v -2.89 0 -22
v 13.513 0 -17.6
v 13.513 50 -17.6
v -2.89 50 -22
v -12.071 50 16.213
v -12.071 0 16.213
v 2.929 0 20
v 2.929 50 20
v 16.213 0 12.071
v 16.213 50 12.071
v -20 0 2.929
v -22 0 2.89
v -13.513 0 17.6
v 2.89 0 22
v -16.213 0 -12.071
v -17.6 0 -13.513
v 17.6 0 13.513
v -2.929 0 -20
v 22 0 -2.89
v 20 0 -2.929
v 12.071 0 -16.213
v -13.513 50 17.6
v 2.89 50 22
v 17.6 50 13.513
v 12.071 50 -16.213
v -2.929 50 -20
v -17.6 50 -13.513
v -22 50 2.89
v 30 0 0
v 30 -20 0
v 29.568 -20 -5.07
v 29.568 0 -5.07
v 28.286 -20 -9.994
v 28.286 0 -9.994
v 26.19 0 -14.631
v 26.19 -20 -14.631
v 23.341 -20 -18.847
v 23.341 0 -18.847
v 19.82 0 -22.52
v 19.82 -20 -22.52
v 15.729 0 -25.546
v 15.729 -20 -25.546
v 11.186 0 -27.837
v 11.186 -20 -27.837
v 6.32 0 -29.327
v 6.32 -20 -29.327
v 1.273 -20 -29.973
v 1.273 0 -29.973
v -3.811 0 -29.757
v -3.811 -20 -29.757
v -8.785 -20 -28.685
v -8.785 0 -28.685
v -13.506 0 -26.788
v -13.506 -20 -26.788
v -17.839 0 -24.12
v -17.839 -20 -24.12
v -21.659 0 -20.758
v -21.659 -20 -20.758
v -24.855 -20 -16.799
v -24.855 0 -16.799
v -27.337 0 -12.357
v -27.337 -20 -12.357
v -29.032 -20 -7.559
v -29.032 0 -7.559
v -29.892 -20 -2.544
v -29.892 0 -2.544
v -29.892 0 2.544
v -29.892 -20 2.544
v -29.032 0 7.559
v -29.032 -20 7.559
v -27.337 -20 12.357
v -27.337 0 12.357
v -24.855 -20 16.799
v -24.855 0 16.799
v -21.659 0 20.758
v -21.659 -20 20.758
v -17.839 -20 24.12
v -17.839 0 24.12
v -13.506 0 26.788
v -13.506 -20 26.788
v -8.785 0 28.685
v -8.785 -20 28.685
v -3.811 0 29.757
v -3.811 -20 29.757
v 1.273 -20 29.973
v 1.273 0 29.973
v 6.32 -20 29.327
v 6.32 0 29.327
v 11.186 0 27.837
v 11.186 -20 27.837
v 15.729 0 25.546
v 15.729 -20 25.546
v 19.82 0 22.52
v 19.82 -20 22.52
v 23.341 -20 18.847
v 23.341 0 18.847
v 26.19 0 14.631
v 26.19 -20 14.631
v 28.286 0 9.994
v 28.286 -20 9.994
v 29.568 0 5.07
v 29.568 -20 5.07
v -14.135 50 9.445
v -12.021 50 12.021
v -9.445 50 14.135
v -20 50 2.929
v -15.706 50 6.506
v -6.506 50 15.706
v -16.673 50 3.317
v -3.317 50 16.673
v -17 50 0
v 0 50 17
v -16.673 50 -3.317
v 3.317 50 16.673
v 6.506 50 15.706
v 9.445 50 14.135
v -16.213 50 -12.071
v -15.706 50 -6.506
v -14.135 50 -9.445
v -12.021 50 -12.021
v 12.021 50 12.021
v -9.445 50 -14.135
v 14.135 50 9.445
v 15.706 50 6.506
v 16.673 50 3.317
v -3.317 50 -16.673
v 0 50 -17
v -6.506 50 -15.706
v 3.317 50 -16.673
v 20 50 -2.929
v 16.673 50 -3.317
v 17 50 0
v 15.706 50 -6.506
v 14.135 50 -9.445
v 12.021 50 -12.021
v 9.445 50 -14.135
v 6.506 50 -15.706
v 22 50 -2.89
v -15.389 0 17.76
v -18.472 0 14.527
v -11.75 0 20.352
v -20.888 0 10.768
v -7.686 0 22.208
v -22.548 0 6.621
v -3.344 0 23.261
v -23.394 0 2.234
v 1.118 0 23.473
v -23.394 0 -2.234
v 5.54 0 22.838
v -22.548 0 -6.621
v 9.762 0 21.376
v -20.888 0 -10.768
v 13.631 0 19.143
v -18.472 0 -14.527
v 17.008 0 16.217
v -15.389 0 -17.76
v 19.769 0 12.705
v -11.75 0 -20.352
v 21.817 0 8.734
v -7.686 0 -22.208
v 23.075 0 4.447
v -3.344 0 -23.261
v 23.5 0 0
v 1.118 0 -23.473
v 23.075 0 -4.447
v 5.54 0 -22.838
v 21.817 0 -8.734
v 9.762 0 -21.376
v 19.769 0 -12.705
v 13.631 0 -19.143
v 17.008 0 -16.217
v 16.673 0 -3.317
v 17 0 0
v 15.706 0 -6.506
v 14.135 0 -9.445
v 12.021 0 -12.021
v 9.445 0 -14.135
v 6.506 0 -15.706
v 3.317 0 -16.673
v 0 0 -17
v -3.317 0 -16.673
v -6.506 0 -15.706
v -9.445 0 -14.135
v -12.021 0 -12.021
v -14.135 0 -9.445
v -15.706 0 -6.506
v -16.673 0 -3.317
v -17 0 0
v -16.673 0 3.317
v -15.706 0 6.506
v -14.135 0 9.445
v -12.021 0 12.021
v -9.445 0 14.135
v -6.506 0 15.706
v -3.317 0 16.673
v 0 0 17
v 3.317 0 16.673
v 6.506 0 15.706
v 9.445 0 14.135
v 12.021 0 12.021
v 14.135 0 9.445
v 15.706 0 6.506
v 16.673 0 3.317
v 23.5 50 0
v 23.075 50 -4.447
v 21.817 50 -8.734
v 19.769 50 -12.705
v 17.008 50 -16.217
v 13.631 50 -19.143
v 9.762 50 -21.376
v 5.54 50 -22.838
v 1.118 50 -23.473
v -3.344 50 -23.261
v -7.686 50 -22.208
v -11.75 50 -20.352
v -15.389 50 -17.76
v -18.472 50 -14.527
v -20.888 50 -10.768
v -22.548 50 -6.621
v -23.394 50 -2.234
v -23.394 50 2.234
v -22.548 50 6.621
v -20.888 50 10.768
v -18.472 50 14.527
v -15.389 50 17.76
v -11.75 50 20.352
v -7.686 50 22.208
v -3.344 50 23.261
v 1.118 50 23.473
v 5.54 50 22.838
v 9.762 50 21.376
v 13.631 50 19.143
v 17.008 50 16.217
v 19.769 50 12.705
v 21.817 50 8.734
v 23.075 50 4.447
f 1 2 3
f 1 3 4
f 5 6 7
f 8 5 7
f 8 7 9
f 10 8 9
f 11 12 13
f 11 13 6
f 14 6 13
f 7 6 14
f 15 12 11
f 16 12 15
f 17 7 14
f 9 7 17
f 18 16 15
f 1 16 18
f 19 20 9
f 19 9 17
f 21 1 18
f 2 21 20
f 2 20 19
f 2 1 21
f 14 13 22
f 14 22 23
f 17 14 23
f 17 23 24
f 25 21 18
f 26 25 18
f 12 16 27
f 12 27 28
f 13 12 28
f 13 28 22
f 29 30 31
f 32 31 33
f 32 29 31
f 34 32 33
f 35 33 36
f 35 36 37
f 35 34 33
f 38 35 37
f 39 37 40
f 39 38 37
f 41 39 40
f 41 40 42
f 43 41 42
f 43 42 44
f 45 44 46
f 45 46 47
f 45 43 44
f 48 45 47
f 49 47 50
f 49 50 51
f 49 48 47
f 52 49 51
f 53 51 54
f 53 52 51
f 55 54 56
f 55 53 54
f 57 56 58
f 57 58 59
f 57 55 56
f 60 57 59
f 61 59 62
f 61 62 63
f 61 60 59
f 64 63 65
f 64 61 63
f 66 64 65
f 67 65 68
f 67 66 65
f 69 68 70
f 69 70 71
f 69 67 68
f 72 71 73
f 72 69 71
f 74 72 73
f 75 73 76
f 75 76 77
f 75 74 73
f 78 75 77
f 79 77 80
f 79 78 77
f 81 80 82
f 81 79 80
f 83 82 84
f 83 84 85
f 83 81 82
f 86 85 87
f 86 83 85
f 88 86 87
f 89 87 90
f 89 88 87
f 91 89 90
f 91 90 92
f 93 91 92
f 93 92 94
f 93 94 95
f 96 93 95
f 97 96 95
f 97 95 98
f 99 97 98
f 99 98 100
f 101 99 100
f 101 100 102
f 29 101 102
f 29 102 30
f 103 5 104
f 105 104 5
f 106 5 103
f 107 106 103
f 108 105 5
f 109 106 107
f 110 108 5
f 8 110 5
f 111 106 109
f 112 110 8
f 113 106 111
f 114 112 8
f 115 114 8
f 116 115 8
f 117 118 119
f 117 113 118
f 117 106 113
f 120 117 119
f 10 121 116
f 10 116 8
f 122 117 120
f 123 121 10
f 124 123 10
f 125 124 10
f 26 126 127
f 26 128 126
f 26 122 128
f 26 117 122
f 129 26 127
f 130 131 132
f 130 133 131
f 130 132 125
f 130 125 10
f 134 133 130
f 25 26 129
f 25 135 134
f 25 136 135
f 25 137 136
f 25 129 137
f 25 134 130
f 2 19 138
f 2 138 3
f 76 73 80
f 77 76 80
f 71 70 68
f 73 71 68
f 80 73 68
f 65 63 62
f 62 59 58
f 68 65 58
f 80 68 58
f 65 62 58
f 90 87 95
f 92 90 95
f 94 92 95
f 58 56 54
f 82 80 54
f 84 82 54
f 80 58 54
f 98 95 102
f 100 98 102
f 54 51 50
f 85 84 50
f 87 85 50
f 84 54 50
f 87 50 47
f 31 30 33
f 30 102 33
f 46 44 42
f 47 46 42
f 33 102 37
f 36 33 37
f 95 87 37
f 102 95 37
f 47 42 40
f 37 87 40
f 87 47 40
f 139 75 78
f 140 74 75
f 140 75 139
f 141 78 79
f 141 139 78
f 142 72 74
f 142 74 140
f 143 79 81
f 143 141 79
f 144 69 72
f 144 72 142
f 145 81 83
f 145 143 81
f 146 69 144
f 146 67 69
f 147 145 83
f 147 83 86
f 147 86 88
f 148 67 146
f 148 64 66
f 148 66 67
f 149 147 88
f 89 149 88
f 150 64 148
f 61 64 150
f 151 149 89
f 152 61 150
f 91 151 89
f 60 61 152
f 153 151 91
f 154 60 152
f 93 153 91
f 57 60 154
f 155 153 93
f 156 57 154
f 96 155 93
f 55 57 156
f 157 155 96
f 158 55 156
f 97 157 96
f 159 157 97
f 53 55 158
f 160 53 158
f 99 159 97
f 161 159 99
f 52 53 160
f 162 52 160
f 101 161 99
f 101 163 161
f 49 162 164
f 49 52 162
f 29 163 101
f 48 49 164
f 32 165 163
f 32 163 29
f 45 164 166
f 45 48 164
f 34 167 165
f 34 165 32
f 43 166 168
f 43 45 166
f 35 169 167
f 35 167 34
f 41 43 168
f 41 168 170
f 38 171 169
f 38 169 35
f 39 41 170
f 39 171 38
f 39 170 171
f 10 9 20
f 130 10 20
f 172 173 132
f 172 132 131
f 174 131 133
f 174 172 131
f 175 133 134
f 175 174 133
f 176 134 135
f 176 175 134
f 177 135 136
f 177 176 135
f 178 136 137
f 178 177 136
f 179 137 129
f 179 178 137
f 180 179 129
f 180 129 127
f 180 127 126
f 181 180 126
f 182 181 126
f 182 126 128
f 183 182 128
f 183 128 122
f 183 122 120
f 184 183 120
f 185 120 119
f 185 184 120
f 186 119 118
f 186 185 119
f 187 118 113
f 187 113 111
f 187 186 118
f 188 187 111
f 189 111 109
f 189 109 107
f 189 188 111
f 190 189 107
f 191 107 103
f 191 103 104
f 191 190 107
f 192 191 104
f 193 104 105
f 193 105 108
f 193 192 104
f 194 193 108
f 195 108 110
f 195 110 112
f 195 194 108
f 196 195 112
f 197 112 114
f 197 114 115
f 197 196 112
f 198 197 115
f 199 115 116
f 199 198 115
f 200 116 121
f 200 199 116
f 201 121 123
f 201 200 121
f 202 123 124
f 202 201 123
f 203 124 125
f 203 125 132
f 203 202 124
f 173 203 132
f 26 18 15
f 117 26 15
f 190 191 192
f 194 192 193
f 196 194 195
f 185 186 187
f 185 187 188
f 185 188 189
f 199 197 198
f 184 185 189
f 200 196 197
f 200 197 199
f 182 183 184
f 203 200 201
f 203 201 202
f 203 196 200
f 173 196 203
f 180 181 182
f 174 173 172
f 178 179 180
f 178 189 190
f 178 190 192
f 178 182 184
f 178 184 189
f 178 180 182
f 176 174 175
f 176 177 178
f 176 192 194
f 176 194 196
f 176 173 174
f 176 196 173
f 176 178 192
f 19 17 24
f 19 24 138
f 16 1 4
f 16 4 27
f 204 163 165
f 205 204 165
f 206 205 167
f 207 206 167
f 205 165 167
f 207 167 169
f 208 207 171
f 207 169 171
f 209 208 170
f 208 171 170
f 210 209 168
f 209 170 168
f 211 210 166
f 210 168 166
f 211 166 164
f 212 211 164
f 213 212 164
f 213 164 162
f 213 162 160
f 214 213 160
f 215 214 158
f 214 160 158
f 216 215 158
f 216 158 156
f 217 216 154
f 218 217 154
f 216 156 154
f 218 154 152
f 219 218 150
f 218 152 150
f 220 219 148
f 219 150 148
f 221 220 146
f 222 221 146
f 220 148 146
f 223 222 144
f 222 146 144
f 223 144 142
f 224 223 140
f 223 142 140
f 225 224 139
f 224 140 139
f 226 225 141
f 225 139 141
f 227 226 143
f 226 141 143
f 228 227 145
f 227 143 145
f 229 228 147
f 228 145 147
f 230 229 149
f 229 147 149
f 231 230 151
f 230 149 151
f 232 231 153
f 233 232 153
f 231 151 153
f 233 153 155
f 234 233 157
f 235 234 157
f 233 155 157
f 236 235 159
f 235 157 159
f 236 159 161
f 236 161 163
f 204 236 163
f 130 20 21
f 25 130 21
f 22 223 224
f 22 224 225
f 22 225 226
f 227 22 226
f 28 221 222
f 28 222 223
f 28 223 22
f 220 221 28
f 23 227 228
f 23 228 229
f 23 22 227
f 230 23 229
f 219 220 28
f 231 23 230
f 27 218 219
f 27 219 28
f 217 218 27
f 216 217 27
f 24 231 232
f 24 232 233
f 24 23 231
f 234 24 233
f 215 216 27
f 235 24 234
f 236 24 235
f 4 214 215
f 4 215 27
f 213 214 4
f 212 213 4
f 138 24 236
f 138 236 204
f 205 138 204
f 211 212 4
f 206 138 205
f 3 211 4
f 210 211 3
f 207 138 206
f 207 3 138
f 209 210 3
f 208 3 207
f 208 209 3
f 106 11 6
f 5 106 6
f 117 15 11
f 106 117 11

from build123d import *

# Parameters (mm, degrees)
SKETCH1_R           = 17
BOSS_EXTRUDE2_DEPTH = 50
SKETCH3_R           = 23.5
BOSS_EXTRUDE4_DEPTH = 50
SKETCH8_R           = 30
BOSS_EXTRUDE5_DEPTH = 20


with BuildPart() as part:
    # Sketch1 → Boss-Extrude2 (new body)
    with BuildSketch(Plane(origin=(0, 0, 0), x_dir=(1, 0, 0), z_dir=(0, 1, 0))):
        Polygon((16.213203436, -12.071067812), (20, 2.928932188), (12.071067812, 16.213203436), (-2.928932188, 20), (-16.213203436, 12.071067812), (-20, -2.928932188), (-12.071067812, -16.213203436), (2.928932188, -20), align=None)
        Circle(SKETCH1_R, mode=Mode.SUBTRACT)
    extrude(amount=BOSS_EXTRUDE2_DEPTH)



with BuildPart() as body_2:
    # Sketch3 → Boss-Extrude4 (new body)
    with BuildSketch(Plane(origin=(0, 0, 0), x_dir=(1, 0, 0), z_dir=(0, 1, 0))):
        Circle(SKETCH3_R)
        Polygon((-2.890242347, 22), (-17.600059149, 13.512639223), (-22, -2.890242347), (-13.512639223, -17.600059149), (2.890242347, -22), (17.600059149, -13.512639223), (22, 2.890242347), (13.512639223, 17.600059149), align=None, mode=Mode.SUBTRACT)
    extrude(amount=BOSS_EXTRUDE4_DEPTH)


with BuildPart() as part_1:
    add(part.part)

    add(body_2.part)  # Boss-Extrude5 merges body 2
    # Sketch8 → Boss-Extrude5 (add)
    with BuildSketch(Plane(origin=(0, 0, 0), x_dir=(1, 0, 0), z_dir=(0, 1, 0))):
        Circle(SKETCH8_R)
    extrude(amount=-BOSS_EXTRUDE5_DEPTH)


solid = part_1.part
